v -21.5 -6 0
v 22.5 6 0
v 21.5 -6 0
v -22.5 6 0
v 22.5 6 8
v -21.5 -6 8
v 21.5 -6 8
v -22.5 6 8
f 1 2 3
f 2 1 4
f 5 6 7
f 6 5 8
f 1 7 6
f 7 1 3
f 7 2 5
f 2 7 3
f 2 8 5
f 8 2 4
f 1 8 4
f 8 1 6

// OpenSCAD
// Rectangular shaft key with chamfered ends.
$fn = 60;
eps = 0.02;
key_w = 12;
key_h = 8;
key_l = 45;
chamfer = 1;
polyhedron(points = [
    [-key_l / 2 + chamfer, -key_w / 2, 0], [key_l / 2 - chamfer, -key_w / 2, 0], [key_l / 2, key_w / 2, 0], [-key_l / 2, key_w / 2, 0],
    [-key_l / 2 + chamfer, -key_w / 2, key_h], [key_l / 2 - chamfer, -key_w / 2, key_h], [key_l / 2, key_w / 2, key_h], [-key_l / 2, key_w / 2, key_h]
], faces = [[0,1,2,3],[4,7,6,5],[0,4,5,1],[1,5,6,2],[2,6,7,3],[3,7,4,0]]);
